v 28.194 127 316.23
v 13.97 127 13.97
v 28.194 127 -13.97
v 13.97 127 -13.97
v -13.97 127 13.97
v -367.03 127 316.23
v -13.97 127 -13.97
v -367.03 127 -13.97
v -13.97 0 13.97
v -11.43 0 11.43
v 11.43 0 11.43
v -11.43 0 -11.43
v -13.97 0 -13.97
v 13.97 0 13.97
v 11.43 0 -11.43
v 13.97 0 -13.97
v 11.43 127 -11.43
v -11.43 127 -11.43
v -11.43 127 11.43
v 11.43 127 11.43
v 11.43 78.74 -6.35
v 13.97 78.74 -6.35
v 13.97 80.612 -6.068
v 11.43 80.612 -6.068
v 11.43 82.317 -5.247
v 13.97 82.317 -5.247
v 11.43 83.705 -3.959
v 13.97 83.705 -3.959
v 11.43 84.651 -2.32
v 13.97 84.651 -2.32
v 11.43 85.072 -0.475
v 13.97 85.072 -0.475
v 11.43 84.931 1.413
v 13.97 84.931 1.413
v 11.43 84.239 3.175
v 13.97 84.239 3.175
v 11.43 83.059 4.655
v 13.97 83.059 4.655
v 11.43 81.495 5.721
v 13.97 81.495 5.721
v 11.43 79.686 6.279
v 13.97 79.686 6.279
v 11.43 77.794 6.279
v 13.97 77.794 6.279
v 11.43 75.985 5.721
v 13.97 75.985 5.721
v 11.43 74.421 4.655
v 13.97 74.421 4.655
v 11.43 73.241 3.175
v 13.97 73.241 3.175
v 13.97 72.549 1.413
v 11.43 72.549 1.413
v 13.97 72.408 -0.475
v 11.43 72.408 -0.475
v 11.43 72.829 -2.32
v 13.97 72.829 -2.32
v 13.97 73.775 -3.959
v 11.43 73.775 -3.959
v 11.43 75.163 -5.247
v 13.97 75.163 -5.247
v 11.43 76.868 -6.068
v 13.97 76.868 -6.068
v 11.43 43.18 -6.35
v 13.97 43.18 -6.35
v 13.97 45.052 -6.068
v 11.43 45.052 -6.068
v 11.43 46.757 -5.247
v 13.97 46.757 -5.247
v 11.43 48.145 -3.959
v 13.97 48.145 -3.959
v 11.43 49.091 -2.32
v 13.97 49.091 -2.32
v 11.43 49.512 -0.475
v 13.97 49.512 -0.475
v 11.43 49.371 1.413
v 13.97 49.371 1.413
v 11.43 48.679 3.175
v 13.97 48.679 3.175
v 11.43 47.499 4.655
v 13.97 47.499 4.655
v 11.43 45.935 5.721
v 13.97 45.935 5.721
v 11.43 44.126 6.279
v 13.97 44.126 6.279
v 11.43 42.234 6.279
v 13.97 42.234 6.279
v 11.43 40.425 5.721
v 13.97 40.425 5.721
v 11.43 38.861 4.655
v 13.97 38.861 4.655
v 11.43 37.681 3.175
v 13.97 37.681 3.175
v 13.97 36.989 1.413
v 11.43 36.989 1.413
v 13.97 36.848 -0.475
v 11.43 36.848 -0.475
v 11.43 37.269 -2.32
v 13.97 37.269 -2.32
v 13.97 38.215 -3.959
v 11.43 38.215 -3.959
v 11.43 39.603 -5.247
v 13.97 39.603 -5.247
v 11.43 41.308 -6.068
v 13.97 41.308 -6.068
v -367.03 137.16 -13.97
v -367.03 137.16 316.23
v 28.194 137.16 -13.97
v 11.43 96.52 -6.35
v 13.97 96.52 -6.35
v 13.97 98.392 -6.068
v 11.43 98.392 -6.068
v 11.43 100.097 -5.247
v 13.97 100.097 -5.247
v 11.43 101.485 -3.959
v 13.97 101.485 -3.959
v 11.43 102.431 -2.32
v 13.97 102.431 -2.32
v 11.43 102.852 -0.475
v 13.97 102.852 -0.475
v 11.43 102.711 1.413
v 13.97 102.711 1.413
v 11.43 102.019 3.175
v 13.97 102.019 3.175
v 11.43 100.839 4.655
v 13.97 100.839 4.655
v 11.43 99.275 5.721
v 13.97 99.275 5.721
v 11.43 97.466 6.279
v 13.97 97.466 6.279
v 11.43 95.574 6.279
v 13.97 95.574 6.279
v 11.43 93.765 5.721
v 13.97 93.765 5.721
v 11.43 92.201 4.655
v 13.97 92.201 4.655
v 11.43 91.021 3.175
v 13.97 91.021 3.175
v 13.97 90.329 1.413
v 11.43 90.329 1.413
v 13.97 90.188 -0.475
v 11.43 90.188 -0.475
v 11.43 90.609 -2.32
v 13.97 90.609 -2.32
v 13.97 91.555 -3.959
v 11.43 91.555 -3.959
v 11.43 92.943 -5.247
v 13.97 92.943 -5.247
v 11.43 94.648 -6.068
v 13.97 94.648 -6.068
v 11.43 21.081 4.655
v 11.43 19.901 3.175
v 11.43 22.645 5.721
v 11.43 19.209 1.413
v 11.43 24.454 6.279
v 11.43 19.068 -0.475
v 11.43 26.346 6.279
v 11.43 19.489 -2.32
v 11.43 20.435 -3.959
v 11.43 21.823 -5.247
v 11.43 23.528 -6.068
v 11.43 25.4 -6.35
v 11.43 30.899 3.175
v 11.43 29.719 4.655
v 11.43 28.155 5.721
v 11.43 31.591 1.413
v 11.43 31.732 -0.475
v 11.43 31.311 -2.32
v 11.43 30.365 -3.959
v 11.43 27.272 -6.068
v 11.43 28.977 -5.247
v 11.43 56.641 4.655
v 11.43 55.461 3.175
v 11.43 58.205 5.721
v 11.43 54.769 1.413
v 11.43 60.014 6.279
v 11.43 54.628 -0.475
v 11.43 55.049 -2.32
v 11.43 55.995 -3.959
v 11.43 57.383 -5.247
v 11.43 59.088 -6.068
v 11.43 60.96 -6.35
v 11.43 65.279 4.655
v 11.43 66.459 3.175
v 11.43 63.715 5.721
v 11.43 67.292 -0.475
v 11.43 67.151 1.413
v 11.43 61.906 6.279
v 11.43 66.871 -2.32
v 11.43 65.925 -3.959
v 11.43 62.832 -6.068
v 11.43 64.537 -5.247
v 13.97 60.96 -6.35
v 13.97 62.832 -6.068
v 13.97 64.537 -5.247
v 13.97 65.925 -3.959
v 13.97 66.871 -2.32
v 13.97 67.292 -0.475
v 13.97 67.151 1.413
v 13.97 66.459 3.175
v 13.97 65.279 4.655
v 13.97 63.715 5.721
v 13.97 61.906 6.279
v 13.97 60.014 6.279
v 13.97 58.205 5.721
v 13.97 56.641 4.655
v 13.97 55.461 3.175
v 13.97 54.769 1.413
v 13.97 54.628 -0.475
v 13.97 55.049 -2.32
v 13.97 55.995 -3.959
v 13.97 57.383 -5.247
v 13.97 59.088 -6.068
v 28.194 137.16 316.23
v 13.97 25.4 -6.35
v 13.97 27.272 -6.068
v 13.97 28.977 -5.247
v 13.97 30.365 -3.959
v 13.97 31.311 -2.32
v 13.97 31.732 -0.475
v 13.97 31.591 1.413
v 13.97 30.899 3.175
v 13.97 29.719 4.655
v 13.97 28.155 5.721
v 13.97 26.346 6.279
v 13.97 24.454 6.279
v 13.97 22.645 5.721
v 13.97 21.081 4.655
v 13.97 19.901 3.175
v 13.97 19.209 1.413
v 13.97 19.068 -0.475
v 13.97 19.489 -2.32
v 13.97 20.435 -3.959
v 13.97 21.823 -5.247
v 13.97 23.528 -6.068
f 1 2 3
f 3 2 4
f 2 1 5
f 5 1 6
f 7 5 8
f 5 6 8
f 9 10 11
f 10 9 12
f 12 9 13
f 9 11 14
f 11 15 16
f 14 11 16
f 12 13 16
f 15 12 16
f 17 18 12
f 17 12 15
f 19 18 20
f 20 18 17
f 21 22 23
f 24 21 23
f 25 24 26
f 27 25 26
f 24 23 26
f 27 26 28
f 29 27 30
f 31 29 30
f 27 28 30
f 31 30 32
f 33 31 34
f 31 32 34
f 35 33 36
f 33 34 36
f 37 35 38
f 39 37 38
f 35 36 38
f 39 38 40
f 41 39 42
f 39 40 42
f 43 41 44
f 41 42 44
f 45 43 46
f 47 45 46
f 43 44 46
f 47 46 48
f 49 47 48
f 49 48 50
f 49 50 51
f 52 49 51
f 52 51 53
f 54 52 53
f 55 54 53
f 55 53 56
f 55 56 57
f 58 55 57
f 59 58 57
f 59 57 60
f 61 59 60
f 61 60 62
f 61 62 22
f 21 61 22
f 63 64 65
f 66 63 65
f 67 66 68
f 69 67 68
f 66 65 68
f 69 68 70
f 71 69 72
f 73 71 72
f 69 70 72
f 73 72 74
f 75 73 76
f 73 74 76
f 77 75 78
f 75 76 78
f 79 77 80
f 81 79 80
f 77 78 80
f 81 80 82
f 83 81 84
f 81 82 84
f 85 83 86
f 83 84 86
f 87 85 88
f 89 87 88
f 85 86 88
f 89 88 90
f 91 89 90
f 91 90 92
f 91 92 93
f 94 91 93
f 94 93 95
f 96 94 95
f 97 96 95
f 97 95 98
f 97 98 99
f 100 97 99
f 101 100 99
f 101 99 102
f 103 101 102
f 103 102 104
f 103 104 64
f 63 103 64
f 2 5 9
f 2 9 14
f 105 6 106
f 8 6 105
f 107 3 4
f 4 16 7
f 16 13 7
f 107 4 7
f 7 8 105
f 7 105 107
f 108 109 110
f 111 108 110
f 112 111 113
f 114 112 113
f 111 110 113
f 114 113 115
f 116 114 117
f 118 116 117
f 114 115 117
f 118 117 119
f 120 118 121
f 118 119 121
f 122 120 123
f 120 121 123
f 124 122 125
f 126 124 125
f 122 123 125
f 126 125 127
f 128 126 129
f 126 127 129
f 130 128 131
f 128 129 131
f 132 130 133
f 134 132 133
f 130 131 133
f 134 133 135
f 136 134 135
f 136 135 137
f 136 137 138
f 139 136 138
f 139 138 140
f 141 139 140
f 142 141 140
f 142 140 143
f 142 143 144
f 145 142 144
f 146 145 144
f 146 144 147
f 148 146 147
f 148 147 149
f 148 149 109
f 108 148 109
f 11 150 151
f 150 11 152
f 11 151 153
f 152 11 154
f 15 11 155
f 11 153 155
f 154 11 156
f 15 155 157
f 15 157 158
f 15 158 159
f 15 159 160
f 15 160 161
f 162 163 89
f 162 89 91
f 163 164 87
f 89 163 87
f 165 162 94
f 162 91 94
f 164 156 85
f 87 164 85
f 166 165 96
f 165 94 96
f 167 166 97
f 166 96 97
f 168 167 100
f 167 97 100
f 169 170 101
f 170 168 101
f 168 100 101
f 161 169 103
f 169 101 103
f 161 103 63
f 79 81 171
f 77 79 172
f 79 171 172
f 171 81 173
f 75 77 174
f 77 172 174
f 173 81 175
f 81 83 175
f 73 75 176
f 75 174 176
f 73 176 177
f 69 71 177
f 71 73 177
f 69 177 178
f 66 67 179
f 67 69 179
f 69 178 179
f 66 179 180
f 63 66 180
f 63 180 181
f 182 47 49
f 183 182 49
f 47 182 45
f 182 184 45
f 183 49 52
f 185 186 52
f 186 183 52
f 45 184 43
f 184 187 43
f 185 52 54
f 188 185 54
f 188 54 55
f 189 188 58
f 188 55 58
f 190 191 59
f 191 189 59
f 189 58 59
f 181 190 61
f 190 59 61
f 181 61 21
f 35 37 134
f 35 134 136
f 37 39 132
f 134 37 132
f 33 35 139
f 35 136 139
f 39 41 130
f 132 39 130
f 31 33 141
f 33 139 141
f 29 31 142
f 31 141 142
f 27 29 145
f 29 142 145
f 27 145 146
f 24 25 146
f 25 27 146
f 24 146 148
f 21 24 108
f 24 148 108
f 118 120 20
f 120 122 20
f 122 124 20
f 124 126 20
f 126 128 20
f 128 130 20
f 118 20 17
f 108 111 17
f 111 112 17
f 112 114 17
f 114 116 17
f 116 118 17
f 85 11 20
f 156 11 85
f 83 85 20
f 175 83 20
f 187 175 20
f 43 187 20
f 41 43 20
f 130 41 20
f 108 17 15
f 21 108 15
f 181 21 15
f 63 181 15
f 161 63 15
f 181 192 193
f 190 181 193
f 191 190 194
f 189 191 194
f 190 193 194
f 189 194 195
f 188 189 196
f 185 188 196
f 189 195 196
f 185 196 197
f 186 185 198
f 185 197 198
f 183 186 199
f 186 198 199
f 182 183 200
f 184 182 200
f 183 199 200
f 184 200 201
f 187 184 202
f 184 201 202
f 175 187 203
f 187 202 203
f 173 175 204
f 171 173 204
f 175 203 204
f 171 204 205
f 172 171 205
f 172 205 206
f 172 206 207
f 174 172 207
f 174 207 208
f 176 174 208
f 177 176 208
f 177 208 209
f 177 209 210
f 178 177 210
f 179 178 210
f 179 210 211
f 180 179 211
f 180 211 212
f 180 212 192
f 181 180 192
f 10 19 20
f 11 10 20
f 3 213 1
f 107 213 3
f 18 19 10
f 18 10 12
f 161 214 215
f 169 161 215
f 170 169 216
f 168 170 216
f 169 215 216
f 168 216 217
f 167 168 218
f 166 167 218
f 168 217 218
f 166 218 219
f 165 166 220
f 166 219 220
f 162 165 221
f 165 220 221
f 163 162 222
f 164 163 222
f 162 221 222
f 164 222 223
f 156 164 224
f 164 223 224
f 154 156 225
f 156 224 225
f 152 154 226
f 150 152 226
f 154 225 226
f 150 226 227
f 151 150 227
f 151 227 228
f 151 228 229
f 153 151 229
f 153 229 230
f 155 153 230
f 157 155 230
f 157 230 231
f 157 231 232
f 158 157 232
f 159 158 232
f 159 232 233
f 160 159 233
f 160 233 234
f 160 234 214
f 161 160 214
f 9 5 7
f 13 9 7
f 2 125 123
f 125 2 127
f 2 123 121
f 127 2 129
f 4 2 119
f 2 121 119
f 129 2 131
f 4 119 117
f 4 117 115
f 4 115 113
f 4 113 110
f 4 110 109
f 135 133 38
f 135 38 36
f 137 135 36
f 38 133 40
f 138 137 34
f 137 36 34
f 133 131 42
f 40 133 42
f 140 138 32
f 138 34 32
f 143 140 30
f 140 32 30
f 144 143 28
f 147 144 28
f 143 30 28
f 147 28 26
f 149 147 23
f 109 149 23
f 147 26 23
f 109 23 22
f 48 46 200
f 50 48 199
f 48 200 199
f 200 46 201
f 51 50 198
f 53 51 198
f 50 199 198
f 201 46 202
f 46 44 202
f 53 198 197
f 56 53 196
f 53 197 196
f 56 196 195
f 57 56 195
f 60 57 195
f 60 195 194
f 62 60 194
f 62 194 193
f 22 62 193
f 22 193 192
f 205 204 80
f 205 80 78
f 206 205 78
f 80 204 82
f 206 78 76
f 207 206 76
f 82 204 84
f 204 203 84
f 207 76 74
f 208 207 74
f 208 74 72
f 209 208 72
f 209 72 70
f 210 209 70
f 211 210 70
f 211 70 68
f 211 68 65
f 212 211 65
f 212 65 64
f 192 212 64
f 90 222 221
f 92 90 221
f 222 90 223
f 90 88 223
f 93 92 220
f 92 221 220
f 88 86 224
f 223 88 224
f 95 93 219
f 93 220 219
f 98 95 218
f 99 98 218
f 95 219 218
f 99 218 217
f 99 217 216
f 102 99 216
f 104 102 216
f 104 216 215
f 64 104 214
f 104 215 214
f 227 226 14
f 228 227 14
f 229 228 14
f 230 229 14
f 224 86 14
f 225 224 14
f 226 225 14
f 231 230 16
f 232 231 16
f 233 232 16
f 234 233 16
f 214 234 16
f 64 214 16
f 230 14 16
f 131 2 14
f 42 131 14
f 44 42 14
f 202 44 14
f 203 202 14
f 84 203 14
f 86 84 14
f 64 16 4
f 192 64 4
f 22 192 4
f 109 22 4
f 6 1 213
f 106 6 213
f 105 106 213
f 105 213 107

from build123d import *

# Parameters (mm, degrees)
SKETCH1_W           = 27.94
SKETCH1_H           = 27.94
BOSS_EXTRUDE1_DEPTH = 127
CUT_EXTRUDE1_REACH  = 130.528
SKETCH2_W           = 22.86
SKETCH2_H           = 22.86
SKETCH3_W           = 381
SKETCH3_H           = 330.2
BOSS_EXTRUDE2_DEPTH = 10.16
CUT_EXTRUDE2_REACH  = 515.785
SKETCH4_R           = 6.35
SKETCH5_W           = 330.2
SKETCH5_H           = 10.16
BOSS_EXTRUDE3_DEPTH = 203.2
SKETCH7_R           = 7.5
CUT_EXTRUDE4_DEPTH  = 5.08
SKETCH8_W           = 330.2
SKETCH8_H           = 10.16
CUT_EXTRUDE5_DEPTH  = 188.976


with BuildPart() as part:
    # Sketch1 → Boss-Extrude1 (new body)
    with BuildSketch(Plane(origin=(0, 0, 0), x_dir=(1, 0, 0), z_dir=(0, 1, 0))):
        Rectangle(SKETCH1_W, SKETCH1_H)
    extrude(amount=BOSS_EXTRUDE1_DEPTH)

    # Sketch2 → Cut-Extrude1 (cut, up to next)
    with BuildSketch(Plane(origin=(0, 127, 0), x_dir=(1, 0, 0), z_dir=(0, 1, 0)), mode=Mode.PRIVATE) as cut_extrude1_sk1:
        Rectangle(SKETCH2_W, SKETCH2_H)
    cut_extrude1_tool1 = extrude(cut_extrude1_sk1.sketch, amount=-CUT_EXTRUDE1_REACH, mode=Mode.PRIVATE) & part.part
    add(cut_extrude1_tool1.solids().sort_by_distance((0, 127, 0))[0], mode=Mode.SUBTRACT)

    # Sketch3 → Boss-Extrude2 (add)
    with BuildSketch(Plane(origin=(0, 127, 0), x_dir=(1, 0, 0), z_dir=(0, 1, 0))):
        with Locations((-176.53, -151.13)):
            Rectangle(SKETCH3_W, SKETCH3_H)
    extrude(amount=BOSS_EXTRUDE2_DEPTH)

    # Sketch4 → Cut-Extrude2 (cut, up to next)
    with BuildSketch(Plane(origin=(13.97, 0, 0), x_dir=(0, 0, -1), z_dir=(1, 0, 0)), mode=Mode.PRIVATE) as cut_extrude2_sk1:
        with Locations((0, 25.4)):
            Circle(SKETCH4_R)
    cut_extrude2_tool1 = extrude(cut_extrude2_sk1.sketch, amount=-CUT_EXTRUDE2_REACH, mode=Mode.PRIVATE) & part.part
    # Sketch4 → Cut-Extrude2 (cut, up to next)
    with BuildSketch(Plane(origin=(13.97, 0, 0), x_dir=(0, 0, -1), z_dir=(1, 0, 0)), mode=Mode.PRIVATE) as cut_extrude2_sk2:
        with Locations((0, 43.18)):
            Circle(SKETCH4_R)
    cut_extrude2_tool2 = extrude(cut_extrude2_sk2.sketch, amount=-CUT_EXTRUDE2_REACH, mode=Mode.PRIVATE) & part.part
    # Sketch4 → Cut-Extrude2 (cut, up to next)
    with BuildSketch(Plane(origin=(13.97, 0, 0), x_dir=(0, 0, -1), z_dir=(1, 0, 0)), mode=Mode.PRIVATE) as cut_extrude2_sk3:
        with Locations((0, 60.96)):
            Circle(SKETCH4_R)
    cut_extrude2_tool3 = extrude(cut_extrude2_sk3.sketch, amount=-CUT_EXTRUDE2_REACH, mode=Mode.PRIVATE) & part.part
    # Sketch4 → Cut-Extrude2 (cut, up to next)
    with BuildSketch(Plane(origin=(13.97, 0, 0), x_dir=(0, 0, -1), z_dir=(1, 0, 0)), mode=Mode.PRIVATE) as cut_extrude2_sk4:
        with Locations((0, 78.74)):
            Circle(SKETCH4_R)
    cut_extrude2_tool4 = extrude(cut_extrude2_sk4.sketch, amount=-CUT_EXTRUDE2_REACH, mode=Mode.PRIVATE) & part.part
    # Sketch4 → Cut-Extrude2 (cut, up to next)
    with BuildSketch(Plane(origin=(13.97, 0, 0), x_dir=(0, 0, -1), z_dir=(1, 0, 0)), mode=Mode.PRIVATE) as cut_extrude2_sk5:
        with Locations((0, 96.52)):
            Circle(SKETCH4_R)
    cut_extrude2_tool5 = extrude(cut_extrude2_sk5.sketch, amount=-CUT_EXTRUDE2_REACH, mode=Mode.PRIVATE) & part.part
    add(cut_extrude2_tool1.solids().sort_by_distance((13.97, 25.4, 0))[0], mode=Mode.SUBTRACT)
    add(cut_extrude2_tool2.solids().sort_by_distance((13.97, 43.18, 0))[0], mode=Mode.SUBTRACT)
    add(cut_extrude2_tool3.solids().sort_by_distance((13.97, 60.96, 0))[0], mode=Mode.SUBTRACT)
    add(cut_extrude2_tool4.solids().sort_by_distance((13.97, 78.74, 0))[0], mode=Mode.SUBTRACT)
    add(cut_extrude2_tool5.solids().sort_by_distance((13.97, 96.52, 0))[0], mode=Mode.SUBTRACT)

    # Sketch5 → Boss-Extrude3 (add)
    with BuildSketch(Plane(origin=(13.97, 0, 0), x_dir=(0, 0, -1), z_dir=(1, 0, 0))):
        with Locations((-151.13, 132.08)):
            Rectangle(SKETCH5_W, SKETCH5_H)
    extrude(amount=BOSS_EXTRUDE3_DEPTH)

    # Sketch7 → Cut-Extrude4 (cut)
    with BuildSketch(Plane.XZ.offset(-127)):
        with Locations(Location((90.17, 43.501665218, 0), (0, 0, 270))):
            Circle(SKETCH7_R)
    extrude(amount=-CUT_EXTRUDE4_DEPTH, mode=Mode.SUBTRACT)

    # Sketch8 → Cut-Extrude5 (cut)
    with BuildSketch(Plane(origin=(217.17, 0, 0), x_dir=(0, 0, -1), z_dir=(1, 0, 0))):
        with Locations((-151.13, 132.08)):
            Rectangle(SKETCH8_W, SKETCH8_H)
    extrude(amount=-CUT_EXTRUDE5_DEPTH, mode=Mode.SUBTRACT)


solid = part.part
